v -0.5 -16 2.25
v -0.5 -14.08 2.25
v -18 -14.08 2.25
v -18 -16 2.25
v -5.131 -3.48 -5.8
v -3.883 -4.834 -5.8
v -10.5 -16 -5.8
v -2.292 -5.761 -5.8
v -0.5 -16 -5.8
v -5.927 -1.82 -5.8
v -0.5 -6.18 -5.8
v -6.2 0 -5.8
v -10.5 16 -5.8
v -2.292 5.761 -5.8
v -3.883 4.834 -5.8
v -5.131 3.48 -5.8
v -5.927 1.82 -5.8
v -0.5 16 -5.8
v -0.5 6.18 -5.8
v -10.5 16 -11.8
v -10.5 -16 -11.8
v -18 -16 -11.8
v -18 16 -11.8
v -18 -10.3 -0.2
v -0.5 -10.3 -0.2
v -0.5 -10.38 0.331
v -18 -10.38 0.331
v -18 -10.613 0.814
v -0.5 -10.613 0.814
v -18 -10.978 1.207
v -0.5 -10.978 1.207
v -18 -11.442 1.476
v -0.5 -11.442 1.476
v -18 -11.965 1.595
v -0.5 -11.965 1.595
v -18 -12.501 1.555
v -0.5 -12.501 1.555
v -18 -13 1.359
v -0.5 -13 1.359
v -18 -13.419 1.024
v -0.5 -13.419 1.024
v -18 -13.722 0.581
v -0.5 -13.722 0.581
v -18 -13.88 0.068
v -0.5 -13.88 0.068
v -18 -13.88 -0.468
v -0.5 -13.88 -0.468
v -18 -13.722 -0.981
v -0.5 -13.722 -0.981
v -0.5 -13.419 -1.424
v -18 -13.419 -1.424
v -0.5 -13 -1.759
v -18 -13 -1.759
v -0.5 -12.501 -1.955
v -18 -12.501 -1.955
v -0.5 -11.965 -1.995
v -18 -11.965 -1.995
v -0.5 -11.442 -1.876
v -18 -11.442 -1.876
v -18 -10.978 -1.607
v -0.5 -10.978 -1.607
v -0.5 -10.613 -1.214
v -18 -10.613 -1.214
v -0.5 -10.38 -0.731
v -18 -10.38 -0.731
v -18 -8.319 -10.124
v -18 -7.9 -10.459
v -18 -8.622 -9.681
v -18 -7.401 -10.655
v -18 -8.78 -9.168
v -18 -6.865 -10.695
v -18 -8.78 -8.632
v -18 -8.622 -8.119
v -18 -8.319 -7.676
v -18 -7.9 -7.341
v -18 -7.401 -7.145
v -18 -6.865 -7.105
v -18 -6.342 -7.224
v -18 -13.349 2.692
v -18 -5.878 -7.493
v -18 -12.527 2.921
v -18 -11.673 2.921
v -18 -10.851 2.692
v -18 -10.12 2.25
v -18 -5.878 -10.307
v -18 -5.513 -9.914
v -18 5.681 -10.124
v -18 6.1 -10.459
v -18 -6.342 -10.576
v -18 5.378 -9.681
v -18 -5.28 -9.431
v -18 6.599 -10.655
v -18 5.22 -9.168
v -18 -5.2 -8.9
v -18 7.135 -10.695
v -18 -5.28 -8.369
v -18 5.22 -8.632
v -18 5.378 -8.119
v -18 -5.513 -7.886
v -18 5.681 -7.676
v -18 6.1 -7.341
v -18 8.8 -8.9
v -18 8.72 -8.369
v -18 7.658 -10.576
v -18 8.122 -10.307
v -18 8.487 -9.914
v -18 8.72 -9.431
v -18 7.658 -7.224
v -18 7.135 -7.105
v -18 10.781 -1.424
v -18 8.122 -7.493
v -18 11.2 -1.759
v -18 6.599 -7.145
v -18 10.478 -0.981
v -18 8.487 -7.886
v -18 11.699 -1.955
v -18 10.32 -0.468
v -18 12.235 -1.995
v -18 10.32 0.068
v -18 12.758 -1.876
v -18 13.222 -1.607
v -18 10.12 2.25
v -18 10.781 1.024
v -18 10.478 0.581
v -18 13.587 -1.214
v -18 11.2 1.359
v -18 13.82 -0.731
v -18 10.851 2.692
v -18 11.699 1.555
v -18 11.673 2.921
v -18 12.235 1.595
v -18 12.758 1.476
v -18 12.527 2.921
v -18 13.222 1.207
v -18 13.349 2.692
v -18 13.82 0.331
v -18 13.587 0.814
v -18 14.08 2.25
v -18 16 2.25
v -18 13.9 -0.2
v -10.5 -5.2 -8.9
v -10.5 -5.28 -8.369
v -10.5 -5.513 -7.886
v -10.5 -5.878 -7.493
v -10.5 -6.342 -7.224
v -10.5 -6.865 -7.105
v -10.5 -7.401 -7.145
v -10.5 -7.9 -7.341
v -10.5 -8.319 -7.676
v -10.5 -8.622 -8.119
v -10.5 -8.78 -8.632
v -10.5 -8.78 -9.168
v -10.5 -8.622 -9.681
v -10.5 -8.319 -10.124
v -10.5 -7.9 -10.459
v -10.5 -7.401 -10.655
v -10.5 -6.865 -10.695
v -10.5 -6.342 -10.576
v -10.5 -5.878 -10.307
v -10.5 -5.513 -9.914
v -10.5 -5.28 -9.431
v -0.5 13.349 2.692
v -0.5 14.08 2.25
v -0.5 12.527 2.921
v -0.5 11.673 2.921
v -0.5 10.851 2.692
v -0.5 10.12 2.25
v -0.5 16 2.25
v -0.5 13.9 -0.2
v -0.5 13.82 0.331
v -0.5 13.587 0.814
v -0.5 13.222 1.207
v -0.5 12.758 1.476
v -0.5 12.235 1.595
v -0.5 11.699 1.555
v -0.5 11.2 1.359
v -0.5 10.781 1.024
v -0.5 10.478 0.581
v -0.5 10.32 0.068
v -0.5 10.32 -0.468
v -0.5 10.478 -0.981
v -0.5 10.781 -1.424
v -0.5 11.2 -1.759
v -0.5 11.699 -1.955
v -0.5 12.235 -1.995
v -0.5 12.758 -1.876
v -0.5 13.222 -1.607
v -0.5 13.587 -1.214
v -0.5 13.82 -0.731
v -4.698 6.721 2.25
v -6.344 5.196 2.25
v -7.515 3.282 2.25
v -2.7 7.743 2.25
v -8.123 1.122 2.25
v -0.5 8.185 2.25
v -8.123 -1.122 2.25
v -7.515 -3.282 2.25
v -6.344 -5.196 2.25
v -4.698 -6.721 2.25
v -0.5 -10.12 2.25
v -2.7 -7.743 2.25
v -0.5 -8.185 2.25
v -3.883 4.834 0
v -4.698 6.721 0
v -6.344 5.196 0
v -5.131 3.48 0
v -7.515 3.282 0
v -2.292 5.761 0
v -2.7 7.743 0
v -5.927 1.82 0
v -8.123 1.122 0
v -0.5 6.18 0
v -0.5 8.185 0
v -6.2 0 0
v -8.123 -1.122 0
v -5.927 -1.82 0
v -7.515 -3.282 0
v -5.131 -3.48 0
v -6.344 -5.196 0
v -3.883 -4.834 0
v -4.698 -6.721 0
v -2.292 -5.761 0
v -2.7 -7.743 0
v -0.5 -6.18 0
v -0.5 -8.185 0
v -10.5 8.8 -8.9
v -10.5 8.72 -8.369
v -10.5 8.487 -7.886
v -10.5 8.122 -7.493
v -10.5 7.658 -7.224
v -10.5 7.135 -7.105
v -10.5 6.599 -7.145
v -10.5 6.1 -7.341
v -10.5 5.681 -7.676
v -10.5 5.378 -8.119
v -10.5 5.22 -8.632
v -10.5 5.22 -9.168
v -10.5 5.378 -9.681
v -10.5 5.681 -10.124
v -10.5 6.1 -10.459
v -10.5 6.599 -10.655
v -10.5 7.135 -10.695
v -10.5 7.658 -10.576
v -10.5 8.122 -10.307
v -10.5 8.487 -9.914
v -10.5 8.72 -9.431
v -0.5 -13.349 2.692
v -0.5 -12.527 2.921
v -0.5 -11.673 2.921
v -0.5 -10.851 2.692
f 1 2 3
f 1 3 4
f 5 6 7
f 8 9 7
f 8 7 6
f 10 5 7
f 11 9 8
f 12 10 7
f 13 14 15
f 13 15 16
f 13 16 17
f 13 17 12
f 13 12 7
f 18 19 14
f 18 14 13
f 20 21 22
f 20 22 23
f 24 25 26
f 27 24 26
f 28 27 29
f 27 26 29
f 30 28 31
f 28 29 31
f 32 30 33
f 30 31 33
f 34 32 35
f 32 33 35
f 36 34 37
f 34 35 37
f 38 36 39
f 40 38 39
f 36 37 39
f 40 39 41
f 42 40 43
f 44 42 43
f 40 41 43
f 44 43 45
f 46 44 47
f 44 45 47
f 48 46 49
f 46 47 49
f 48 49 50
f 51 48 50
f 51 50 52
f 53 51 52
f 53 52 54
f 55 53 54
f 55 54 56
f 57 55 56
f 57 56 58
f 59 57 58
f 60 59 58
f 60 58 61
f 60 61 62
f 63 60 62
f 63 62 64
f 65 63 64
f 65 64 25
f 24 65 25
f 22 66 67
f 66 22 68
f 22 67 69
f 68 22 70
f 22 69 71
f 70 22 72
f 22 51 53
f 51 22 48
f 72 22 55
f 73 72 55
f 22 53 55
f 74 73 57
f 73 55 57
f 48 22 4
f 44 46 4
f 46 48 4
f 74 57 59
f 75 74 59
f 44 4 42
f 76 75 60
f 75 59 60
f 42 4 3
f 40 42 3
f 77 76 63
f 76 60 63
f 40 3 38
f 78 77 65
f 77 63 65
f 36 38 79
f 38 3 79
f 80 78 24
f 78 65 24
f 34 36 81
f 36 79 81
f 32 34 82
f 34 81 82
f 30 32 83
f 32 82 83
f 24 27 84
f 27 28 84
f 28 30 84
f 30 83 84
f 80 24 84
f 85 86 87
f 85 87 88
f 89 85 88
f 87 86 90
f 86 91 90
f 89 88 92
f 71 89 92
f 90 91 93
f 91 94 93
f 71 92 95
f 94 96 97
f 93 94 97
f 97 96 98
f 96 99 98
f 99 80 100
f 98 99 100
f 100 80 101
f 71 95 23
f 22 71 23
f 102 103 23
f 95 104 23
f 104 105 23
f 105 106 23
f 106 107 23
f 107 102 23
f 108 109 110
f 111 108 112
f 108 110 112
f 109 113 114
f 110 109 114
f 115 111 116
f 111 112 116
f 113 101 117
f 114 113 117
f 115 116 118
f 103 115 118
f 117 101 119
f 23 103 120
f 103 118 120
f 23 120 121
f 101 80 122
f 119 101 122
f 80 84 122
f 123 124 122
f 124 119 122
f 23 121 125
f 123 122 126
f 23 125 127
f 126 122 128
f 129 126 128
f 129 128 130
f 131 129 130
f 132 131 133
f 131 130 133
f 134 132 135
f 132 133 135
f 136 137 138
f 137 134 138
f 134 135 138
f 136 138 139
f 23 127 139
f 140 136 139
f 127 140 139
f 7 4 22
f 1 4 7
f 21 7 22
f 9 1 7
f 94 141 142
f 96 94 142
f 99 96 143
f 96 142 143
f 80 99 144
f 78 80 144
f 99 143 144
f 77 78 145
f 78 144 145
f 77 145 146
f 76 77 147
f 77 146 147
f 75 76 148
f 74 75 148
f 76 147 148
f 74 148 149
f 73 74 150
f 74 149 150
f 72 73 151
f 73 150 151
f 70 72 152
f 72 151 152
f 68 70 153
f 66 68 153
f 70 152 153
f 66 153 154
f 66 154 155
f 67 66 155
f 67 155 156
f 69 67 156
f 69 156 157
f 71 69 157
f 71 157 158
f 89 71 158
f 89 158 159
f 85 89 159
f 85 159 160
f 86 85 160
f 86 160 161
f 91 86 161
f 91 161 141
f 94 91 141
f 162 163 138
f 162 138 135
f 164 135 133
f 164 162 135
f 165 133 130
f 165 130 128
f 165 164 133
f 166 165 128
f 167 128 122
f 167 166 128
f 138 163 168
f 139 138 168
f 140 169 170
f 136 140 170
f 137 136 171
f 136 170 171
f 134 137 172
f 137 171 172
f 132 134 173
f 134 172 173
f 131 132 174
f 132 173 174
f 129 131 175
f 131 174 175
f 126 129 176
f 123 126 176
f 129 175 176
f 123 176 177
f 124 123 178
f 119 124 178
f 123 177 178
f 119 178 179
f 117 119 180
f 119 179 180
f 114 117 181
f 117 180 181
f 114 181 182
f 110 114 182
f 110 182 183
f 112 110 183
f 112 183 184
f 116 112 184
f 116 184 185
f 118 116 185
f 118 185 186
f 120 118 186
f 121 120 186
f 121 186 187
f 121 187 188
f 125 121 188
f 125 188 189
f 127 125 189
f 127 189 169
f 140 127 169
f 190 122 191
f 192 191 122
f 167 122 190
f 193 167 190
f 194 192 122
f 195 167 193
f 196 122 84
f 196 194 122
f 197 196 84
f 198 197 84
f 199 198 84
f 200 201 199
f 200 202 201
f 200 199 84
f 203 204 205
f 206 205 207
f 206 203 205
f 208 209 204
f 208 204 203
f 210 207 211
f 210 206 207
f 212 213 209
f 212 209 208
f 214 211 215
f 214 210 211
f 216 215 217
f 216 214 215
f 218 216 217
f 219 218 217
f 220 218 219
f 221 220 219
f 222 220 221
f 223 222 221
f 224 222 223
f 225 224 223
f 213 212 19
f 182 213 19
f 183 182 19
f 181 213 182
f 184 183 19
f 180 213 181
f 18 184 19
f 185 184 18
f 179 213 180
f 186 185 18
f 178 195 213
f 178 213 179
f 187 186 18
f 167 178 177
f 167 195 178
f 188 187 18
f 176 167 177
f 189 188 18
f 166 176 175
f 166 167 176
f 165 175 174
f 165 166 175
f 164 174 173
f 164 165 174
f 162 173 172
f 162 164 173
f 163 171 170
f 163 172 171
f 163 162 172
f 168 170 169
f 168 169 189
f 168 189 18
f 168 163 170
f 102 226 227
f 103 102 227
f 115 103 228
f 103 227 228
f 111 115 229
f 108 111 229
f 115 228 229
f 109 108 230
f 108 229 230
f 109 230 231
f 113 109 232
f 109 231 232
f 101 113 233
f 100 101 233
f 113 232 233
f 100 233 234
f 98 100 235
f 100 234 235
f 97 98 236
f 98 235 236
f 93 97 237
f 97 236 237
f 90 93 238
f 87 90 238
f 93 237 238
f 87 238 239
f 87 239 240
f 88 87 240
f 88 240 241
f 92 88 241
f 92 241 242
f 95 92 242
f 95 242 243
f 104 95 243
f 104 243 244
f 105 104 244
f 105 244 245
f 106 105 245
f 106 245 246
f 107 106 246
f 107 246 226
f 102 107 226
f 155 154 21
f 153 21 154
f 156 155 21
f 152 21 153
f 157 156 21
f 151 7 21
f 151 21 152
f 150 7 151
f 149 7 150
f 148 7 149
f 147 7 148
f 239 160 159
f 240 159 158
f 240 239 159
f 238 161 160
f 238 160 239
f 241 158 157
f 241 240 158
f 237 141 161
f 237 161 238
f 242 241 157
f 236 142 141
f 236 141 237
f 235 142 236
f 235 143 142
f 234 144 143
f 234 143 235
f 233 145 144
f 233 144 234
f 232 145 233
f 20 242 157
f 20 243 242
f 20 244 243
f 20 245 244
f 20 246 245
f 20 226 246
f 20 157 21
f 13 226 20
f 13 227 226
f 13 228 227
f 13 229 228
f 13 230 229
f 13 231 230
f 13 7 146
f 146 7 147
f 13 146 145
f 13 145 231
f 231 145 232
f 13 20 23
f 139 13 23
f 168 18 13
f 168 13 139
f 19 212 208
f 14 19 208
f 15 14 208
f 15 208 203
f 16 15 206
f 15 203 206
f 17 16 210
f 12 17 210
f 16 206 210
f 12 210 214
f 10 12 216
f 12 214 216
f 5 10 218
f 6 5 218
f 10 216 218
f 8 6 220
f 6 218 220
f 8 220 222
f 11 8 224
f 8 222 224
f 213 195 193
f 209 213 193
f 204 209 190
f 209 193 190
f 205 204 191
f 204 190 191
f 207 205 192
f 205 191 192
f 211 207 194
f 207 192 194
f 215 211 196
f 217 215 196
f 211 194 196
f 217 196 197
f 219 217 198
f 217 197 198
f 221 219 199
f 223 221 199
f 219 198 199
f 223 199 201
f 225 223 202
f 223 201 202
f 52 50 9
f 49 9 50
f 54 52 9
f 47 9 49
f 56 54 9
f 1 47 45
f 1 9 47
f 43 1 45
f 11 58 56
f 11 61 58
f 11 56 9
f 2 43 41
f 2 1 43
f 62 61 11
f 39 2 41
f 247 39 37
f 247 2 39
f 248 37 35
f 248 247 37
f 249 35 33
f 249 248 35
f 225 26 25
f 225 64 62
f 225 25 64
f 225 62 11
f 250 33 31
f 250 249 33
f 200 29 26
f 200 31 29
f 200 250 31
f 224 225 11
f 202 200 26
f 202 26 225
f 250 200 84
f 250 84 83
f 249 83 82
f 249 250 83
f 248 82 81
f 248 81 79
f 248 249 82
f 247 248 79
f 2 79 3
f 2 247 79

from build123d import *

# Parameters (mm, degrees)
SKETCH017_R     = 1.8
PAD008_DEPTH    = 18
SKETCH018_W     = 32
SKETCH018_H     = 6
POCKET_DEPTH    = 10.5
POCKET001_DEPTH = 14.051
POCKET002_DEPTH = 2.25
SKETCH_W        = 39.26252
SKETCH_H        = 23.934808
POCKET003_DEPTH = 0.5


with BuildPart() as part:
    # Sketch017 → Pad008 (new body)
    with BuildSketch(Plane.YZ):
        with BuildLine():
            Line((-16, 2.25), (-16, 0))
            Line((-16, 0), (-16, -5.8))
            Line((-16, -5.8), (-16, -11.8))
            Line((-16, -11.8), (16, -11.8))
            Line((16, -11.8), (16, -5.8))
            Line((16, -5.8), (16, 0))
            Line((16, 0), (16, 2.25))
            Line((14.0798989873, 2.25), (16, 2.25))
            ThreePointArc((14.0798989873, 2.25), (12.1, 2.95), (10.1201010127, 2.25))
            Line((10.1201010127, 2.25), (-10.1201010127, 2.25))
            ThreePointArc((-10.1201010127, 2.25), (-12.1, 2.95), (-14.0798989873, 2.25))
            Line((-14.0798989873, 2.25), (-16, 2.25))
        make_face()
        with Locations((-7, -8.9)):
            Circle(SKETCH017_R, mode=Mode.SUBTRACT)
        with Locations((7, -8.9)):
            Circle(SKETCH017_R, mode=Mode.SUBTRACT)
        with Locations((-12.1, -0.2)):
            Circle(SKETCH017_R, mode=Mode.SUBTRACT)
        with Locations((12.1, -0.2)):
            Circle(SKETCH017_R, mode=Mode.SUBTRACT)
    extrude(amount=-PAD008_DEPTH)

    # Sketch018 (on Face17 of Pad008) → Pocket (cut)
    with BuildSketch(Plane.YZ):
        with Locations((0, -8.8)):
            Rectangle(SKETCH018_W, SKETCH018_H)
    extrude(amount=-POCKET_DEPTH, mode=Mode.SUBTRACT)

    # Sketch019 (on Face3 of Pocket) → Pocket001 (cut, through all)
    with BuildSketch(Plane(origin=(0, 0, 2.25), x_dir=(0, -1, 0), z_dir=(0, 0, 1))):
        with BuildLine():
            ThreePointArc((-6.2, 0), (0, -6.2), (6.2, 0))
            Line((-6.2, 0), (6.2, 0))
        make_face()
    extrude(amount=-POCKET001_DEPTH, mode=Mode.SUBTRACT)

    # Sketch020 (on Face3 of Pocket001) → Pocket002 (cut)
    with BuildSketch(Plane(origin=(0, 0, 2.25), x_dir=(0, -1, 0), z_dir=(0, 0, 1))):
        with BuildLine():
            ThreePointArc((-8.2, 0), (0, -8.2), (8.2, 0))
            Line((-8.2, 0), (8.2, 0))
        make_face()
    extrude(amount=-POCKET002_DEPTH, mode=Mode.SUBTRACT)

    # Sketch (on Face8 of Pocket002) → Pocket003 (cut)
    with BuildSketch(Plane.YZ):
        with Locations((0.008158, -3.713083)):
            Rectangle(SKETCH_W, SKETCH_H)
    extrude(amount=-POCKET003_DEPTH, mode=Mode.SUBTRACT)


solid = part.part
